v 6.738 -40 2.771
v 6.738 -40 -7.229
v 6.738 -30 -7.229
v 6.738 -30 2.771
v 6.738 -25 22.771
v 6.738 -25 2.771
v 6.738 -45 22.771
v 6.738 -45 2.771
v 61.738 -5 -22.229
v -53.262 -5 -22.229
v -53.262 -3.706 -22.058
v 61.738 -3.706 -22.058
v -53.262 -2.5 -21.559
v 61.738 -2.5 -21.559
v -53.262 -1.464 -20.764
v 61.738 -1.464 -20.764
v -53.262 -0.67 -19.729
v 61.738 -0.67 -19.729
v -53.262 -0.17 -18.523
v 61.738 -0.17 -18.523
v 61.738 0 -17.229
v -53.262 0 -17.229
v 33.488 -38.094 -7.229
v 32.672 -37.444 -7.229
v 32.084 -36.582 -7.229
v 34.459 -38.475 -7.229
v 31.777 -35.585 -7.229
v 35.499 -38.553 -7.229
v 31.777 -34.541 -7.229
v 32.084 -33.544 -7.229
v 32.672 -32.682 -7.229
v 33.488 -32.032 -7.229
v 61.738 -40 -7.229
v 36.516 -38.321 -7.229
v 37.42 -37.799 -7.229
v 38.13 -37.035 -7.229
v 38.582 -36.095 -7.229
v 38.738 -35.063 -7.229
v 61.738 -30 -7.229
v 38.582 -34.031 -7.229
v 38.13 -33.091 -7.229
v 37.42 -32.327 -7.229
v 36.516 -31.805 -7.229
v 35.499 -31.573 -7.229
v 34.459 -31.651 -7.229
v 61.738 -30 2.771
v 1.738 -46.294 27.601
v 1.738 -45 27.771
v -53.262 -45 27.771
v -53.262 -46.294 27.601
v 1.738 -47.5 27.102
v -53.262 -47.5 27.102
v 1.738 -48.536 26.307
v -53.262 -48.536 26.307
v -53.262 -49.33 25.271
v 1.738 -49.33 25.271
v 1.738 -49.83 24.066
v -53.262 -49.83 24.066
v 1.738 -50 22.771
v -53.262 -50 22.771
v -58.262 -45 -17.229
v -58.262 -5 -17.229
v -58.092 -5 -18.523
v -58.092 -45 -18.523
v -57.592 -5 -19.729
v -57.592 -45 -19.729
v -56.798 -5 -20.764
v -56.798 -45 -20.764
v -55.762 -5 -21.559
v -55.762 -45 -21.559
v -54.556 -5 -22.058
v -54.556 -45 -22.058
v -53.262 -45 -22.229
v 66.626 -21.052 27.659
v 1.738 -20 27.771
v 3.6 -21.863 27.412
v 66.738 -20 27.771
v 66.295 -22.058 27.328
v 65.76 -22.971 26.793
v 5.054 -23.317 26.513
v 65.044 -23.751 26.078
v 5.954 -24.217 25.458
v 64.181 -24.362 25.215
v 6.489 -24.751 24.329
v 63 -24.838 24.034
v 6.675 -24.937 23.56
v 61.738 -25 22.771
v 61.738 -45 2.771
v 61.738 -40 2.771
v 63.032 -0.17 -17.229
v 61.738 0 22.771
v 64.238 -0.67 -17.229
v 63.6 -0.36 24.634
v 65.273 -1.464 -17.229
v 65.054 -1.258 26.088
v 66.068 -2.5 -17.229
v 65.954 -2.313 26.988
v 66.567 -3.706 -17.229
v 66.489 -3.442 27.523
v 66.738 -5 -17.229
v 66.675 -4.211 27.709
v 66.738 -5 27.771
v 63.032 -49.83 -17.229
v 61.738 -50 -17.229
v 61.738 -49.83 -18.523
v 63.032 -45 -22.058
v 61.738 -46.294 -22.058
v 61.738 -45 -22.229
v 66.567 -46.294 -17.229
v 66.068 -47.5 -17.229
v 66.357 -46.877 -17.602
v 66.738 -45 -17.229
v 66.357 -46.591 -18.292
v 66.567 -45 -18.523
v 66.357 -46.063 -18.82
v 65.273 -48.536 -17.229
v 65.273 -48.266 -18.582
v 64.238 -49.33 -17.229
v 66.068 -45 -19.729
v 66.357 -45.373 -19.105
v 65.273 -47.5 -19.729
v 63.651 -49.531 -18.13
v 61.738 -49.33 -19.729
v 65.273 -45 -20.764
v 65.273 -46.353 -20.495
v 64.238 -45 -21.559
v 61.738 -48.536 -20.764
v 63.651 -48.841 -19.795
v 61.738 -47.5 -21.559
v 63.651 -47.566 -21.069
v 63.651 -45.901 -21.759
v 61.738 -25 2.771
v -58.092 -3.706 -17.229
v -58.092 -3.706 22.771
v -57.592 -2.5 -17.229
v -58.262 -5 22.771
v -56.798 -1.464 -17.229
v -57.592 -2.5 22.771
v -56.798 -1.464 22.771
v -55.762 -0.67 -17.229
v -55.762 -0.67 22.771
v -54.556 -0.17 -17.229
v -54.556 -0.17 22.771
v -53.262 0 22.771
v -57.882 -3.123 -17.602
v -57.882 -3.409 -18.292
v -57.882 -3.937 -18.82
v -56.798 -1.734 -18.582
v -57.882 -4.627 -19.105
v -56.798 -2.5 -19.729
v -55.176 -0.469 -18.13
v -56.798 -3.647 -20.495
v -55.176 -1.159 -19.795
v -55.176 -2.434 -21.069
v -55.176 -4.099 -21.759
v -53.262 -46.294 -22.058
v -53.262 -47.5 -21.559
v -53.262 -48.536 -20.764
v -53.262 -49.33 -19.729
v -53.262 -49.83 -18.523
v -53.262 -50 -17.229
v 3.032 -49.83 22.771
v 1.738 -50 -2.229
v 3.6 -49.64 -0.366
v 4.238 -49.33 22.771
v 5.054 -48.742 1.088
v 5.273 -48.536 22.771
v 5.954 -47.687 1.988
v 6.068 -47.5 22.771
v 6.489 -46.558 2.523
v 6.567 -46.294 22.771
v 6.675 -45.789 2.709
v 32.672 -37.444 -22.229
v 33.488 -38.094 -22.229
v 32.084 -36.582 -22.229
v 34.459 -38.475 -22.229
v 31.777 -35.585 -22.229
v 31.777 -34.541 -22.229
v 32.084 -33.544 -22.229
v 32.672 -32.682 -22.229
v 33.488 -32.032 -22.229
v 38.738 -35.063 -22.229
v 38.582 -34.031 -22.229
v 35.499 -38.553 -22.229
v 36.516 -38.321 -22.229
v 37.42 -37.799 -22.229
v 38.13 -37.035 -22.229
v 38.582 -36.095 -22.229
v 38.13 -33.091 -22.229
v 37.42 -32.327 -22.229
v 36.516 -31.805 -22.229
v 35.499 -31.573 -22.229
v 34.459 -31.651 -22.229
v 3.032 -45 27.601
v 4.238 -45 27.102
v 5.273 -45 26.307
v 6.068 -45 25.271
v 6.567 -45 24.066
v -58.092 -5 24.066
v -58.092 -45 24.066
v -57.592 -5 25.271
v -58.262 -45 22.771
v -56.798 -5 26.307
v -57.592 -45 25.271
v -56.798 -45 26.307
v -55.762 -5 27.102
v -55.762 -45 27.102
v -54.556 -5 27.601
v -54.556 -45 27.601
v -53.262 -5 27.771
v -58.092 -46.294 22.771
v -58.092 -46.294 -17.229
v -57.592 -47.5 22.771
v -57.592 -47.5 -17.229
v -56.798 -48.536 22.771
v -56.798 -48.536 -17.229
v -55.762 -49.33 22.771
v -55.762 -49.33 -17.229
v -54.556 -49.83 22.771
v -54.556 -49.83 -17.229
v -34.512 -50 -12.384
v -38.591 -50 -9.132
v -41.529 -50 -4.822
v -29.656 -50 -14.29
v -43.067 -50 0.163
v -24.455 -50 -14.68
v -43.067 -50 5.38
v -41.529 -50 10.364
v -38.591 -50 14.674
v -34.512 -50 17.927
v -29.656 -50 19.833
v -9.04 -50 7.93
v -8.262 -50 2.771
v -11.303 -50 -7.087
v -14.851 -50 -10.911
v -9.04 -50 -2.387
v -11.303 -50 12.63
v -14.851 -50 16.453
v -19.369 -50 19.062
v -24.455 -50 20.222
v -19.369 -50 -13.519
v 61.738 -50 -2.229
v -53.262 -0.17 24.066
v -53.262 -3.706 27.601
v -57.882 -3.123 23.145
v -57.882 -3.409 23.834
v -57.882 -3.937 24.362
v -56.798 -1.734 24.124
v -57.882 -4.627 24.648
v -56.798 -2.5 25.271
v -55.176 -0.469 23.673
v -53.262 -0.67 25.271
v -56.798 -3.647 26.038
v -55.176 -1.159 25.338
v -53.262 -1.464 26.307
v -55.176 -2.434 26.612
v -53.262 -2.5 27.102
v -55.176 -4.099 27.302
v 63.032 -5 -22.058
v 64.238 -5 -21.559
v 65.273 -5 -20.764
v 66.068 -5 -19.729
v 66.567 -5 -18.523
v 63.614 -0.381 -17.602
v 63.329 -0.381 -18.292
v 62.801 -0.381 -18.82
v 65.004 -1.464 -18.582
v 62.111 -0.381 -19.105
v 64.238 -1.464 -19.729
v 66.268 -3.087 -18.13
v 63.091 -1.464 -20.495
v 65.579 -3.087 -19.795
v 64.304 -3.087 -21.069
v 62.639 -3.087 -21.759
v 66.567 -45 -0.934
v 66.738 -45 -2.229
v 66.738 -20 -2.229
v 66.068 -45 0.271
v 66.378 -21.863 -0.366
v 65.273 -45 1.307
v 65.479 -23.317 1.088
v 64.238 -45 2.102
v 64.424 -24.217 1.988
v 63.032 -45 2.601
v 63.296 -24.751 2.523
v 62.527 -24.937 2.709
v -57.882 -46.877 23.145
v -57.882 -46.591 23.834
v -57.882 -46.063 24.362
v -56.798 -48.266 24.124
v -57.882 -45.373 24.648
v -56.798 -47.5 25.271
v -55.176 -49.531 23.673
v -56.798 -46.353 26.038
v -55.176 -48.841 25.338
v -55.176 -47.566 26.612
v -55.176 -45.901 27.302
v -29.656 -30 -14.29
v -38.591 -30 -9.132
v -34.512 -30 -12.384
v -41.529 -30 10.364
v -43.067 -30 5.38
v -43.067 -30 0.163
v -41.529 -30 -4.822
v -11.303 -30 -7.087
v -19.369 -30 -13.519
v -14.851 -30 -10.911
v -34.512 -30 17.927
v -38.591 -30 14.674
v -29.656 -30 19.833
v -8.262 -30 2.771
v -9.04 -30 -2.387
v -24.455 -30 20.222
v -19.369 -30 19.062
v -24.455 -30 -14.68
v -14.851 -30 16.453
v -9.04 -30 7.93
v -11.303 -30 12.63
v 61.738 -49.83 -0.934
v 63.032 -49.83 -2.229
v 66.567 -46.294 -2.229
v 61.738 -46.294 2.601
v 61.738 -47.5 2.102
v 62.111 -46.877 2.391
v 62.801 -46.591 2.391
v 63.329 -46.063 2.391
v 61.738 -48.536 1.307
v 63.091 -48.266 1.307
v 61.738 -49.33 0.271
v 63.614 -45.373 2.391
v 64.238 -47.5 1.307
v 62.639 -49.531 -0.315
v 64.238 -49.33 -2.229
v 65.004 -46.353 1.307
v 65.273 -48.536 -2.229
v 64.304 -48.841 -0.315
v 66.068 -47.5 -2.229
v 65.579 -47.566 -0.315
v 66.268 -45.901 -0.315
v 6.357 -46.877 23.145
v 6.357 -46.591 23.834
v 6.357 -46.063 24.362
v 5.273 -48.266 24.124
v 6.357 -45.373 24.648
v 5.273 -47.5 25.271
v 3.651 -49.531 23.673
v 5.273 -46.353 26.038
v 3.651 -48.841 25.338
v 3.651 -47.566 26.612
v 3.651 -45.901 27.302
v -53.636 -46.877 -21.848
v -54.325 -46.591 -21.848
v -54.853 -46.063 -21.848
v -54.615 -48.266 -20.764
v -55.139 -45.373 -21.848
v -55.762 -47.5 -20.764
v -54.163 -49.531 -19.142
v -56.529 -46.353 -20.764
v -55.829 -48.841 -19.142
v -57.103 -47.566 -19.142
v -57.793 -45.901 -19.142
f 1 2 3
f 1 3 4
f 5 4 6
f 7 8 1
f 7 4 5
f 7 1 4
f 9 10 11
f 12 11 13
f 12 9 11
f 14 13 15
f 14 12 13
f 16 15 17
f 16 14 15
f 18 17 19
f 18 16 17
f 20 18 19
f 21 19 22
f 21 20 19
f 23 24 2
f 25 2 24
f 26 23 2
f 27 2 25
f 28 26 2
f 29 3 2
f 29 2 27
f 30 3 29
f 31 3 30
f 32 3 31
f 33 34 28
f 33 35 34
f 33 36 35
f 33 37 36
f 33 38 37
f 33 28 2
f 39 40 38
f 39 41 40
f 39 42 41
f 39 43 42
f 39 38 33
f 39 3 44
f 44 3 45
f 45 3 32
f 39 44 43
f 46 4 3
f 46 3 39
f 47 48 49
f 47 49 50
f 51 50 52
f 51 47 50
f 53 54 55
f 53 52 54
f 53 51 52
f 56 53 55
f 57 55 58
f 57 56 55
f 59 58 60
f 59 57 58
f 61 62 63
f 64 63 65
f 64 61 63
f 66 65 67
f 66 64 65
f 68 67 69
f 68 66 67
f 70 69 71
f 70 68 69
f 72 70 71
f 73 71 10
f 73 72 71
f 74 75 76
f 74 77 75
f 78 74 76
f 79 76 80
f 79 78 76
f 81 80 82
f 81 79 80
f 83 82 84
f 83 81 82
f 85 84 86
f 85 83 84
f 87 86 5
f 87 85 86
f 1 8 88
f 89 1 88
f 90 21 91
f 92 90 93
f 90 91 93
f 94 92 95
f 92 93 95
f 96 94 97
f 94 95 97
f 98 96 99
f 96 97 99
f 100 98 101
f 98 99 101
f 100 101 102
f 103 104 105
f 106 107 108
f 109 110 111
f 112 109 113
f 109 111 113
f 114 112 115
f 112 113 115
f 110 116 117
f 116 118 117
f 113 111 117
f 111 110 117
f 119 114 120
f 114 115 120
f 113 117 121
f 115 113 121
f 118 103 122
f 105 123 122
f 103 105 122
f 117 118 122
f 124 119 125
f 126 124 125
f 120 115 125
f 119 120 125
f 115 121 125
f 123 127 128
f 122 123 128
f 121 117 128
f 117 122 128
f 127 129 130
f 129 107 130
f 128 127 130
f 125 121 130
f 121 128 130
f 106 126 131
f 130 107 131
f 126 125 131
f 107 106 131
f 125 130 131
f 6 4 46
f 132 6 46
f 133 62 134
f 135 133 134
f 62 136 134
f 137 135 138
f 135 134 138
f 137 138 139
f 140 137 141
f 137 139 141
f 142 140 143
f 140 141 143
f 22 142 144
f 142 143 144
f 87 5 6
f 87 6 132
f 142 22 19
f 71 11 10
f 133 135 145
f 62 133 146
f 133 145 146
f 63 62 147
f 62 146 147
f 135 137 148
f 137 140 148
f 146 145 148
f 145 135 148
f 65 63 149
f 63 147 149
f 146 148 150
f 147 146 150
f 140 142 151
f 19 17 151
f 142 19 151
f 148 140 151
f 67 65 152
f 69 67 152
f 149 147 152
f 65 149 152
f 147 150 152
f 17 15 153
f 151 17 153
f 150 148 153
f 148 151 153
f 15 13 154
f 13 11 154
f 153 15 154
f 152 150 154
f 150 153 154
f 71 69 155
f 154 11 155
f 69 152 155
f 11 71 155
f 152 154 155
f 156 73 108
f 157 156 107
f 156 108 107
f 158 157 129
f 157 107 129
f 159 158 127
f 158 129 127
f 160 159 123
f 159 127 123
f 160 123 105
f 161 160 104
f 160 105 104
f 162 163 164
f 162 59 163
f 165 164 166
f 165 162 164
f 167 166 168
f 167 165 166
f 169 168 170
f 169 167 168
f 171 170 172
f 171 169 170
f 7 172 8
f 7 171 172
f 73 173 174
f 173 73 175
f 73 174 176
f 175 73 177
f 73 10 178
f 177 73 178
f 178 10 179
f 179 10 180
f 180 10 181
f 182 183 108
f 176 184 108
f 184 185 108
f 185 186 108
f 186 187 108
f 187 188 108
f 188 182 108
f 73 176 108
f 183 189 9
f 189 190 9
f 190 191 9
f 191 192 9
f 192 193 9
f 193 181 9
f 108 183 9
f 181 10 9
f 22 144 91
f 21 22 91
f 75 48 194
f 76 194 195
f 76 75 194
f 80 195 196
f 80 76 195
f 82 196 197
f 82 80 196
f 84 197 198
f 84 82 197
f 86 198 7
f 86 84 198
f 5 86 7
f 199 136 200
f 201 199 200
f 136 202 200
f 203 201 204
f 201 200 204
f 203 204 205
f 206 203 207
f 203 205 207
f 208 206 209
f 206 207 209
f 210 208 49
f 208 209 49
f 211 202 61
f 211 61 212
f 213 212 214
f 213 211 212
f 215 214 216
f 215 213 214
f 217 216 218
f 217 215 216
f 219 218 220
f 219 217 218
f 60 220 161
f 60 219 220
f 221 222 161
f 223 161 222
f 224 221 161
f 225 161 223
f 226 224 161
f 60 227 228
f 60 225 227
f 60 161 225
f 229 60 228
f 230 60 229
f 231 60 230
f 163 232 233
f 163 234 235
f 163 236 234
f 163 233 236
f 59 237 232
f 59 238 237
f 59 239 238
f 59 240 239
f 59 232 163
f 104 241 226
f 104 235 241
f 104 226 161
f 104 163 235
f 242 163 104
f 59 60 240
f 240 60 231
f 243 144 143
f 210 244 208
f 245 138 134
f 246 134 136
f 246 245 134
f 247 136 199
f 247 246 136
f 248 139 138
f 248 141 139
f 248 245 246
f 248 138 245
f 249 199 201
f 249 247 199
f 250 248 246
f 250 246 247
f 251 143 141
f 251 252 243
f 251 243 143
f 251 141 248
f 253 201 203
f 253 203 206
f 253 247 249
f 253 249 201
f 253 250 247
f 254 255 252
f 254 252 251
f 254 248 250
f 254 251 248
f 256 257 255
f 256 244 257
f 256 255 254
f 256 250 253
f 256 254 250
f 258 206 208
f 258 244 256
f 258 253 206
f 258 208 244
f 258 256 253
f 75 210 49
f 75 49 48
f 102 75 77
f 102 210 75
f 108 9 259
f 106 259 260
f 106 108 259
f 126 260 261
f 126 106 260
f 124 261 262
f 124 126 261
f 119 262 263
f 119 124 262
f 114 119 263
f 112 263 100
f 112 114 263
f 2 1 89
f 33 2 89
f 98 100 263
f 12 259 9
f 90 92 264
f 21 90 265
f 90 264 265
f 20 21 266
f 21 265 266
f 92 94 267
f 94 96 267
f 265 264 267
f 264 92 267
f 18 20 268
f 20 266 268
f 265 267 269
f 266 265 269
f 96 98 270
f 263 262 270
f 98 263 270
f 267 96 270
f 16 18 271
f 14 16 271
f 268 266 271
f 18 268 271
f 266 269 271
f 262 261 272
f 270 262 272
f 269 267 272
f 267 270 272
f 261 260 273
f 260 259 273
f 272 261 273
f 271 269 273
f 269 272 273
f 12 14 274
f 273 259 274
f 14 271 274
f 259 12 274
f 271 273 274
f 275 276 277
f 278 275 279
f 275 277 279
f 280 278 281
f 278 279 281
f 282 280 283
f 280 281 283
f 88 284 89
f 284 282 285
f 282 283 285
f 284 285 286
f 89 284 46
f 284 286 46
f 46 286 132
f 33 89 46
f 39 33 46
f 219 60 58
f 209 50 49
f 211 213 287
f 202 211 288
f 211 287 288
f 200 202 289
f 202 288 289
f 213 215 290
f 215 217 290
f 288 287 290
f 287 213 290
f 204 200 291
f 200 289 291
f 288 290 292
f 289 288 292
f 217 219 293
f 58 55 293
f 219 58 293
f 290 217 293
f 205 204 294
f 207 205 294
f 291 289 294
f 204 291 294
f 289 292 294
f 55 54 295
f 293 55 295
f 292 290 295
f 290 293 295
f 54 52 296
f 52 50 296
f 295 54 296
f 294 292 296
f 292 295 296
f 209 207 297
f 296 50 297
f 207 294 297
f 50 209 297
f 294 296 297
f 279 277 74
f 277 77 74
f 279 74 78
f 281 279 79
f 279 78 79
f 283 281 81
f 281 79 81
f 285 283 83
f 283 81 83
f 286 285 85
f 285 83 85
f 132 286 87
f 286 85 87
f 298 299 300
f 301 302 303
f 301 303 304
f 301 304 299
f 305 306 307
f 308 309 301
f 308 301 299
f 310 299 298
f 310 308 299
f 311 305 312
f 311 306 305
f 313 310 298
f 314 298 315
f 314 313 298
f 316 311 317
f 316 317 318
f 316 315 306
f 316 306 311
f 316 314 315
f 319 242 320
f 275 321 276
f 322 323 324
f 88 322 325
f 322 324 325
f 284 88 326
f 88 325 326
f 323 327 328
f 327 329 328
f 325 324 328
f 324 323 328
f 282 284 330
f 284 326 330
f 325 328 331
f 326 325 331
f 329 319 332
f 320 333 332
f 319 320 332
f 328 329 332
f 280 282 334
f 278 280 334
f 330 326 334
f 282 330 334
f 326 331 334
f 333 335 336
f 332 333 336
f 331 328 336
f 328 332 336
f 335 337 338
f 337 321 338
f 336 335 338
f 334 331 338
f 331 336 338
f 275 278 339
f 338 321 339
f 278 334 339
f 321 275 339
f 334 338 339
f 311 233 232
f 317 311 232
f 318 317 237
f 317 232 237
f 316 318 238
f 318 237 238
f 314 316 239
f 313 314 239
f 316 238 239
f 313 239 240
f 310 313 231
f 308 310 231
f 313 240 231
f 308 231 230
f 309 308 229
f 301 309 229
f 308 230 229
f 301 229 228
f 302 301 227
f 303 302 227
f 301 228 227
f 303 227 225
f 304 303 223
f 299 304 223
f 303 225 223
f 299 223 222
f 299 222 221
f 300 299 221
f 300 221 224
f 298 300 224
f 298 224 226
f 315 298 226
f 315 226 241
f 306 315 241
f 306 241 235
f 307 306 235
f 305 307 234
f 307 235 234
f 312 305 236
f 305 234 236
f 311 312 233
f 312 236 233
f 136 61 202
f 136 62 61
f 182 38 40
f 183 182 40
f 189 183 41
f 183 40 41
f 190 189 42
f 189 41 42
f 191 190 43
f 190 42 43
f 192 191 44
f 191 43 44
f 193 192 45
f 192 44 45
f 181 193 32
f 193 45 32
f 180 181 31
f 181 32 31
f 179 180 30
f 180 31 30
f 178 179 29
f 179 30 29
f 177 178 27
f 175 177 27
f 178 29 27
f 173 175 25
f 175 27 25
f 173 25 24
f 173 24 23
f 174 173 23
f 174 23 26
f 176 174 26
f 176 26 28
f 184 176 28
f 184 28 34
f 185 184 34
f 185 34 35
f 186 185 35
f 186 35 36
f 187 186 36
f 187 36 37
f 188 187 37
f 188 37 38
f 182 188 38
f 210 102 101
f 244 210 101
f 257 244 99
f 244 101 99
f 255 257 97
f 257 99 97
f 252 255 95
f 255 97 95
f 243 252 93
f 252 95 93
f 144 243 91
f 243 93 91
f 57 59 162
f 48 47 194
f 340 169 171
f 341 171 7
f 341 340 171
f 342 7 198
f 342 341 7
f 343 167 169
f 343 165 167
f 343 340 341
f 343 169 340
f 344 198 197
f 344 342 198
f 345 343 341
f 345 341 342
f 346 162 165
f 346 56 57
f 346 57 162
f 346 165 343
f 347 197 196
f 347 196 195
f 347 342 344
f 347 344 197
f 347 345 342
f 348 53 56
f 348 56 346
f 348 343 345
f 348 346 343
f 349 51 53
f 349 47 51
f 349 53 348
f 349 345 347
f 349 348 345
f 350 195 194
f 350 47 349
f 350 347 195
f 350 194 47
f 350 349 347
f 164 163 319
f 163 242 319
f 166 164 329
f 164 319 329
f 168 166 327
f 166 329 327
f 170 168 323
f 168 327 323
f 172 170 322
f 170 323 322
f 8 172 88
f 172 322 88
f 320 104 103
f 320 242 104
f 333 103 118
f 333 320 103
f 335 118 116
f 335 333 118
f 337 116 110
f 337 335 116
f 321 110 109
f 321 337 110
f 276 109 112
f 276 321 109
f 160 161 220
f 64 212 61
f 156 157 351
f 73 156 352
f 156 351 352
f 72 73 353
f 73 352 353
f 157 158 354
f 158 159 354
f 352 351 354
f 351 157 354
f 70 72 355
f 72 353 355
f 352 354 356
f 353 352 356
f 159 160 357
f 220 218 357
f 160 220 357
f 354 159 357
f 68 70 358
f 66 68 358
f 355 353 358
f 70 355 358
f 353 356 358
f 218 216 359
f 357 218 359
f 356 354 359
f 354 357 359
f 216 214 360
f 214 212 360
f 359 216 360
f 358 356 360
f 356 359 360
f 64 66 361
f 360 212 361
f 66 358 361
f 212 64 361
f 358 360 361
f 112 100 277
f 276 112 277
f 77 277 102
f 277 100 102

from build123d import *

# Parameters (mm, degrees)
F0_W      = 125
F0_H      = 50
F1_DEPTH  = 50
F2_W      = 60
F2_H      = 25
F3_DEPTH  = 25
F4_R      = 17.5
F5_DEPTH  = 20
F6_R      = 5
F7_W      = 55
F7_H      = 10
F8_DEPTH  = 10
F9_R      = 3.5
F10_DEPTH = 25


with BuildPart() as f1:
    # F0 (on Front) → F1 (new body)
    with BuildSketch(Plane.XZ):
        with Locations((4.2377149548, 2.7714315802)):
            Rectangle(F0_W, F0_H)
    extrude(amount=F1_DEPTH)

    # F2 (on face) → F3 (cut)
    with BuildSketch(Plane.XZ.offset(50)):
        with Locations((36.7377149548, 15.2714315802)):
            Rectangle(F2_W, F2_H)
    extrude(amount=-F3_DEPTH, mode=Mode.SUBTRACT)

    # F4 (on face) → F5 (cut)
    with BuildSketch(Plane.XZ.offset(50)):
        with Locations((-25.7622850452, 2.7714315802)):
            Circle(F4_R)
    extrude(amount=-F5_DEPTH, mode=Mode.SUBTRACT)

    # F6
    f6_edges = [f1.edges().sort_by_distance(p)[0] for p in [
        (-25.762285, -50, 27.771432),
        (-58.262285, -50, 2.771432),
        (4.237715, -50, -22.228568),
        (66.737715, -50, -9.728568),
        (36.737715, -50, 2.771432),
        (6.737715, -50, 15.271432),
        (6.737715, -37.5, 27.771432),
        (36.737715, -25, 27.771432),
        (66.737715, -25, 15.271432),
        (66.737715, -37.5, 2.771432),
        (66.737715, -25, -22.228568),
        (66.737715, 0, 2.771432),
        (4.237715, 0, 27.771432),
        (4.237715, 0, -22.228568),
        (-58.262285, 0, 2.771432),
        (-58.262285, -25, 27.771432),
        (-58.262285, -25, -22.228568),
    ]]
    fillet(f6_edges, radius=F6_R)

    # F7 (on face) → F8 (cut)
    with BuildSketch(Plane.XY.offset(2.7714315802)):
        with Locations((34.2377149548, -35)):
            Rectangle(F7_W, F7_H)
    extrude(amount=-F8_DEPTH, mode=Mode.SUBTRACT)

    # F9 (on face) → F10 (cut)
    with BuildSketch(Plane.XY.offset(-7.2285684198)):
        with Locations((35.2377149548, -35.0629985332)):
            Circle(F9_R)
    extrude(amount=-F10_DEPTH, mode=Mode.SUBTRACT)


solid = f1.part
